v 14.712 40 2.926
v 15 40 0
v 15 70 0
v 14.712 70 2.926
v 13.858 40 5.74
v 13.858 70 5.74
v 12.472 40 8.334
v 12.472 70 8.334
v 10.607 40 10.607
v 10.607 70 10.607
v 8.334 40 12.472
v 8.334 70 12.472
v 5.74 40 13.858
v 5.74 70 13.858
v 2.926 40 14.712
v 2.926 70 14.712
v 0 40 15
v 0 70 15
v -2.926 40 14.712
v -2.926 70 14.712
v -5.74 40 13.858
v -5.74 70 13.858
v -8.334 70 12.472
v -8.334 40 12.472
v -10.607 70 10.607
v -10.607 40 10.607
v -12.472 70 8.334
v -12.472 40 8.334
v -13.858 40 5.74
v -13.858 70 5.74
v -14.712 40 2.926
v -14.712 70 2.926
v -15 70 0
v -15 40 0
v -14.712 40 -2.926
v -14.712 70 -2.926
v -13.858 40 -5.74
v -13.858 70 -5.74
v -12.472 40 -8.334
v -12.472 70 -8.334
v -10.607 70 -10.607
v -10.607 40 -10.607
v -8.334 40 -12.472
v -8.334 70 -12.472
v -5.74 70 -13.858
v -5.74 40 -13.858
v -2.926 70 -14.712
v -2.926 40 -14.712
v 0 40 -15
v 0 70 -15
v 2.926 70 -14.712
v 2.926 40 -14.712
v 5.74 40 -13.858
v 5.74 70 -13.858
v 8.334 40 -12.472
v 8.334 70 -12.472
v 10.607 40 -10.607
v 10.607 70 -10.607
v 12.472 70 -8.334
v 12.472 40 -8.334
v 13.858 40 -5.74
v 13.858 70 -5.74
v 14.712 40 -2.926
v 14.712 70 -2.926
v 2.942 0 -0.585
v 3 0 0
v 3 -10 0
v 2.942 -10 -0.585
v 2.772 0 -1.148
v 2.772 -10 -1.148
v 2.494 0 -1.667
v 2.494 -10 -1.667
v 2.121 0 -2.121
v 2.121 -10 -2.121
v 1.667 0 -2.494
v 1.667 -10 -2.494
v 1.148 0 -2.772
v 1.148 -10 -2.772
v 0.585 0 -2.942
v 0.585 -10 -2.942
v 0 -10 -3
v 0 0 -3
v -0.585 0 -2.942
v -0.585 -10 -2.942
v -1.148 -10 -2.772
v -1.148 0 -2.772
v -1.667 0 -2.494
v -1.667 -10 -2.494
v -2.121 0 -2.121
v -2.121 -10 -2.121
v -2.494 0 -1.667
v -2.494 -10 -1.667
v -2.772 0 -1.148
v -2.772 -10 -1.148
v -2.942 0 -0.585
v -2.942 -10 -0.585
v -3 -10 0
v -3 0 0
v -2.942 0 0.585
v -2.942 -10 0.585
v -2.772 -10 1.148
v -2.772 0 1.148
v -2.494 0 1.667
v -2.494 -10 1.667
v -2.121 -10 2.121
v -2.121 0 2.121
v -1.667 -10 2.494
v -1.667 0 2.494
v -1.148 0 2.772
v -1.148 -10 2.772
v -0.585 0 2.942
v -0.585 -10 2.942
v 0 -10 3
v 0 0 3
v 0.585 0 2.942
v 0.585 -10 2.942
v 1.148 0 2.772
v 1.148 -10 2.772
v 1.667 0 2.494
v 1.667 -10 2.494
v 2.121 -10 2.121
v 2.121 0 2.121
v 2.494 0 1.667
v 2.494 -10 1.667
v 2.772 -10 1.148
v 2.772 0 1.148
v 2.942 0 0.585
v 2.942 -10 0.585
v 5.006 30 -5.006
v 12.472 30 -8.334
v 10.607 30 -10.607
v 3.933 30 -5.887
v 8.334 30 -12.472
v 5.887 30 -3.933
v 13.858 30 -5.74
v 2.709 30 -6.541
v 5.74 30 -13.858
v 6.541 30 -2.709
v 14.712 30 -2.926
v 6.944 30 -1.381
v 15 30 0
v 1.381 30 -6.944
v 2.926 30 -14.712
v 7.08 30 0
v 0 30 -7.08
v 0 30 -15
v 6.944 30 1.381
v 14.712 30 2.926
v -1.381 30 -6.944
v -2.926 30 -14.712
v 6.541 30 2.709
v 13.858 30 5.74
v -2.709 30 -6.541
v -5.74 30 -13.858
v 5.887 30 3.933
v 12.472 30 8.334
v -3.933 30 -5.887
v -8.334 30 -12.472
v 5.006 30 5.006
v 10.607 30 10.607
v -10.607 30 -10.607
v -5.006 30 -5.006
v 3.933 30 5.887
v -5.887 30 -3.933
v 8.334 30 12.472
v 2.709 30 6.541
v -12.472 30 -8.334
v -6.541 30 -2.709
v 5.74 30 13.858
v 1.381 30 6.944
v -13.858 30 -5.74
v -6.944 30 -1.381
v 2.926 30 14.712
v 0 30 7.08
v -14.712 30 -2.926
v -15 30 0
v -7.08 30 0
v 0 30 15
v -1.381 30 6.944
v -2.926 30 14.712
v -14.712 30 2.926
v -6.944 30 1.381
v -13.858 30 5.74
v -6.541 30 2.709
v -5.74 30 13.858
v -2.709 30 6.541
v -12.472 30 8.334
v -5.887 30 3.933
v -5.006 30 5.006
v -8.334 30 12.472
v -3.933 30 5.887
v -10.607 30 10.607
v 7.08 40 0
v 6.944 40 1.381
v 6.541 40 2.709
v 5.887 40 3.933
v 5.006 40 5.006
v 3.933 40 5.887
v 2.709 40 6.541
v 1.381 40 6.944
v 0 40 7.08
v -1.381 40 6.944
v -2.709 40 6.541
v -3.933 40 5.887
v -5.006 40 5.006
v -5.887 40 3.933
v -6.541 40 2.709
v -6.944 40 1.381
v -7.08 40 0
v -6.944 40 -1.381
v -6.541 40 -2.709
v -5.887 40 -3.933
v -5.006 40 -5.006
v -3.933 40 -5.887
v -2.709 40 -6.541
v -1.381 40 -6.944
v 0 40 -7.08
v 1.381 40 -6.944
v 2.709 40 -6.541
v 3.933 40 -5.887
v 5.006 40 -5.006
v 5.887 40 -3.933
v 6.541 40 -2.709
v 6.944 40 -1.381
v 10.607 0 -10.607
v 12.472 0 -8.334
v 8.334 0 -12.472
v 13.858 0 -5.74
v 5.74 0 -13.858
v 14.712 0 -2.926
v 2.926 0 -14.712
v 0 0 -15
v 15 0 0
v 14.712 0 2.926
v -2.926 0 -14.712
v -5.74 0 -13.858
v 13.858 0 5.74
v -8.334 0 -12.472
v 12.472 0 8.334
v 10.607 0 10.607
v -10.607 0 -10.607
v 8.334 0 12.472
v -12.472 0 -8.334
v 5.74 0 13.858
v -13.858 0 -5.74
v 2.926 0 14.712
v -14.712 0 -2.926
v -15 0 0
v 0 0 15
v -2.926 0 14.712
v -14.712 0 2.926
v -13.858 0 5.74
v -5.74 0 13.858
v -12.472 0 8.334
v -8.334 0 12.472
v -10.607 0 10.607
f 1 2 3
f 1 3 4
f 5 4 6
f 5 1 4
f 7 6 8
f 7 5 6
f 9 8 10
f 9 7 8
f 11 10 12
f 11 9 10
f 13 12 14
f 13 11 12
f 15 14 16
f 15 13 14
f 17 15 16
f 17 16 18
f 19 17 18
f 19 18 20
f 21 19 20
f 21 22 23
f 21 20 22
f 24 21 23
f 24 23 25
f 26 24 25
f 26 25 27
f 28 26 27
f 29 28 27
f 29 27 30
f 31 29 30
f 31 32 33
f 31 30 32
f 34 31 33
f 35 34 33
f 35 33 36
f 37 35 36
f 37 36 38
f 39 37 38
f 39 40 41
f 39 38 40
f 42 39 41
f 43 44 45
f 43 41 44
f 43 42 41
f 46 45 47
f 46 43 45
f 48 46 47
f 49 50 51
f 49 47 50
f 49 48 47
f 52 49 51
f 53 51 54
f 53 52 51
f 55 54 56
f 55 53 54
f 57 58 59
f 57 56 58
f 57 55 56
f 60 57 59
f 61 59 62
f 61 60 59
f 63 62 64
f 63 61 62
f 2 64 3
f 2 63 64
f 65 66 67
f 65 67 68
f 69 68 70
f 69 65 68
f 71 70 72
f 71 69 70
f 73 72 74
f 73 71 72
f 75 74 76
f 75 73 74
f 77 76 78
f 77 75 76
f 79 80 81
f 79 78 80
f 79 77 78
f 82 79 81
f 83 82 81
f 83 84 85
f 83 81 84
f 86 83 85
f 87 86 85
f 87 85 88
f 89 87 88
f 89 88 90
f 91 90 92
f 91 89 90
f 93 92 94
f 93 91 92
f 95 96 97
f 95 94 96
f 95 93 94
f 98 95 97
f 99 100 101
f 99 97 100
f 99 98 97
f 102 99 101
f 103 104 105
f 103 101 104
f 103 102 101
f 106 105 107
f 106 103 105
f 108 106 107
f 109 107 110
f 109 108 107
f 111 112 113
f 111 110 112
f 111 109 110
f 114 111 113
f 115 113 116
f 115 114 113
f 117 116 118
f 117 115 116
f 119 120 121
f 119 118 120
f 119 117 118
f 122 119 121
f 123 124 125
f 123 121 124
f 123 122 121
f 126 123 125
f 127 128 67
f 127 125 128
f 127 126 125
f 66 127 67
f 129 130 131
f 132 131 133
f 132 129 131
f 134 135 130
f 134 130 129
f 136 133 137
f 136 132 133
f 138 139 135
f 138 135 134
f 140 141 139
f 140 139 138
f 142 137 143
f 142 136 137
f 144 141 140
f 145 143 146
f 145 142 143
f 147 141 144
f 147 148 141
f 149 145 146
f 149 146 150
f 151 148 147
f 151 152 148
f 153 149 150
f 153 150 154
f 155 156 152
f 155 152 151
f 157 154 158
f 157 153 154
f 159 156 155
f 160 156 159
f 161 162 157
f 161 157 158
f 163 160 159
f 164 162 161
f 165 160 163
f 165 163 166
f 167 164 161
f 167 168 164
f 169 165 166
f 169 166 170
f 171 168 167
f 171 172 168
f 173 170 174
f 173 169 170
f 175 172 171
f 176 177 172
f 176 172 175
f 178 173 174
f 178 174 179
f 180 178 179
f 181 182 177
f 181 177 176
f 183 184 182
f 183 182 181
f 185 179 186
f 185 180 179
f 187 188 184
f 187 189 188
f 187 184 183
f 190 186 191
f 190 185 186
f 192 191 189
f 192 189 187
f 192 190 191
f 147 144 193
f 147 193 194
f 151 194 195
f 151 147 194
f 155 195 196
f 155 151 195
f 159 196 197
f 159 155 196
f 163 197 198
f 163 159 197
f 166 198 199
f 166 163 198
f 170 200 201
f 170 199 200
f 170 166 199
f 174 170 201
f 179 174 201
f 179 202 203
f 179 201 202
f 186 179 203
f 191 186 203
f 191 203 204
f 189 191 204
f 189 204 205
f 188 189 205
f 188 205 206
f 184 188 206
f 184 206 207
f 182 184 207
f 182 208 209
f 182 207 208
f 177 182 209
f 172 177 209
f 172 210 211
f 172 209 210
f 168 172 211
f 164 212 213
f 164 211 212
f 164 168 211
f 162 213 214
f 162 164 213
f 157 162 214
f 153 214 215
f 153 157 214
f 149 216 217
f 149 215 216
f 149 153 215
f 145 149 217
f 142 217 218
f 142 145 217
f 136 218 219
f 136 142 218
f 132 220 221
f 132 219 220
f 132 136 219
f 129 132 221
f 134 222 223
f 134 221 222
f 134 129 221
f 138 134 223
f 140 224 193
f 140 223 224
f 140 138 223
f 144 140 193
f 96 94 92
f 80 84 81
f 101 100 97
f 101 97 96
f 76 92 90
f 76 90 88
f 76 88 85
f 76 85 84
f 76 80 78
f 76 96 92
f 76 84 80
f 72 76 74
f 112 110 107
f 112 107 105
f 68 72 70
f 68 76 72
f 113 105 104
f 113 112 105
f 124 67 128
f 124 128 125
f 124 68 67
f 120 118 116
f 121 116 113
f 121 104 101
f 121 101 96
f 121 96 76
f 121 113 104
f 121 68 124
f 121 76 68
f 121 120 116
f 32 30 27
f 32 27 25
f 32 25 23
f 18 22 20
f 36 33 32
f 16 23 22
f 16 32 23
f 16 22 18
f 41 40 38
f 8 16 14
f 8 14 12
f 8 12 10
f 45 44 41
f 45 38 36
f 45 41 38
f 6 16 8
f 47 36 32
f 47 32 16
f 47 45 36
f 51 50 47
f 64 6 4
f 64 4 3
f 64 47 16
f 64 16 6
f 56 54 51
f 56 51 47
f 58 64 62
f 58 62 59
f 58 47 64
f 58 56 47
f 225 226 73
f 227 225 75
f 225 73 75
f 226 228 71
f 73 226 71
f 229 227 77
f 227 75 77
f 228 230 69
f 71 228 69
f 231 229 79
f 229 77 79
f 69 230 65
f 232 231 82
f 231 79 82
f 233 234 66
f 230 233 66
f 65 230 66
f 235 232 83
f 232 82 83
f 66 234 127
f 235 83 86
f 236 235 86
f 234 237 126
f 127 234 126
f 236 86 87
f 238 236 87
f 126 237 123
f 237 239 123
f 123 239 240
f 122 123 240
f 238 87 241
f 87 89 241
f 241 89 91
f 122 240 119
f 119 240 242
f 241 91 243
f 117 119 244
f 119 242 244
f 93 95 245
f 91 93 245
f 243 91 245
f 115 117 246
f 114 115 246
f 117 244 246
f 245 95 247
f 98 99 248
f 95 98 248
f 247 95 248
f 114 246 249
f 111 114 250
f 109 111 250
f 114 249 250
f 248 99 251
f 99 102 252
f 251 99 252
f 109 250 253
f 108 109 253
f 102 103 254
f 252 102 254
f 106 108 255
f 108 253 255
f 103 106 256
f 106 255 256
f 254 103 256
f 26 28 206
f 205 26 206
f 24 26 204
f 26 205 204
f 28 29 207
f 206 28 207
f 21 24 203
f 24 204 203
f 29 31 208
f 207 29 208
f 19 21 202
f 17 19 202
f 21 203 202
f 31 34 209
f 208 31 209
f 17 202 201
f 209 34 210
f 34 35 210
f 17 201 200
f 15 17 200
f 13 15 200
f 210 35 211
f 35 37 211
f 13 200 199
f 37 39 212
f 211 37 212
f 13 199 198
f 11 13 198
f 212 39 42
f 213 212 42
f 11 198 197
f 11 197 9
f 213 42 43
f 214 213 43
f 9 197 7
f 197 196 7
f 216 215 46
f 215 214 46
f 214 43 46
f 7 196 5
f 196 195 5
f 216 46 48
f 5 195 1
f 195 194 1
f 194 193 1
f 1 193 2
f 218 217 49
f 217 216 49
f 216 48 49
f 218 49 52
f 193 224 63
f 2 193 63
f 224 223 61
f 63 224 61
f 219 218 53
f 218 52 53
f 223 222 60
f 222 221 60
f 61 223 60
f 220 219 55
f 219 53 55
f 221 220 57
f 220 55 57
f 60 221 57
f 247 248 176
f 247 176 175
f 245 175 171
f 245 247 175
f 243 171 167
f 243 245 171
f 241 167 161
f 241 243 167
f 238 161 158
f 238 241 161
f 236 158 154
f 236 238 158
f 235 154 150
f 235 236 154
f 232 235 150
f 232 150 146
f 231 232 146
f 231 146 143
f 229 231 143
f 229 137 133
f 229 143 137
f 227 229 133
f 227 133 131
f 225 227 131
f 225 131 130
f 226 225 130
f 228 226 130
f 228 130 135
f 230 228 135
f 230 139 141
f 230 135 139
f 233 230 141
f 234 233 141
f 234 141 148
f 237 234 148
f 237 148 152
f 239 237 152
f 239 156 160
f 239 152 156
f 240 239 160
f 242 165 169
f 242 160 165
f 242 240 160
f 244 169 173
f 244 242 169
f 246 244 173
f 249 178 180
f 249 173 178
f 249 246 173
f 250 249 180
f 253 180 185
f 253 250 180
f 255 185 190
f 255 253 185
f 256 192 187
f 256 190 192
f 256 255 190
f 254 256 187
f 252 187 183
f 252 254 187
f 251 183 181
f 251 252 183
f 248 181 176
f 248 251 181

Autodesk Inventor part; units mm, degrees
ref_plane "YZ Plane" through (0, 0, 0) normal (1, 0, 0) x (0, 1, 0)
ref_plane "XZ Plane" through (0, 0, 0) normal (0, 1, 0) x (-1, 0, 0)
ref_plane "XY Plane" through (0, 0, 0) normal (0, 0, 1) x (1, 0, 0)
sketch "スケッチ1" plane through (0, 0, 0) normal (0, 1, 0) x (-1, 0, 0)
  circle A0 centre (0, 0) radius 3
  circle A1 centre (0, 0) radius 15
  dimension "d0" = 6
  dimension "d1" = 30
extrude "押し出し1" add sketch "スケッチ1" along normal blind 30 contours A0 | A1
sketch "スケッチ2" plane through (0, 0, 0) normal (0, -1, 0) x (1, 0, 0)
  circle A0 centre (0, 0) radius 3
  dimension "d4" = 6
extrude "押し出し2" add sketch "スケッチ2" along normal blind 10
sketch "スケッチ3" plane through (0, 30, 0) normal (0, 1, 0) x (1, 0, 0)
  circle A0 centre (0, 0) radius 3
  dimension "d7" = 6
extrude "押し出し3" add sketch "スケッチ3" along normal blind 10
sketch "スケッチ4" plane through (0, 40, 0) normal (0, 1, 0) x (1, 0, 0)
  circle A0 centre (0, 0) radius 15
extrude "押し出し4" add sketch "スケッチ4" along normal blind 30
sketch "スケッチ5" plane through (0, 30, 0) normal (0, 1, 0) x (1, 0, 0)
  circle A0 centre (0, 0) radius 7.0798
extrude "押し出し5" add sketch "スケッチ5" along normal blind 10
